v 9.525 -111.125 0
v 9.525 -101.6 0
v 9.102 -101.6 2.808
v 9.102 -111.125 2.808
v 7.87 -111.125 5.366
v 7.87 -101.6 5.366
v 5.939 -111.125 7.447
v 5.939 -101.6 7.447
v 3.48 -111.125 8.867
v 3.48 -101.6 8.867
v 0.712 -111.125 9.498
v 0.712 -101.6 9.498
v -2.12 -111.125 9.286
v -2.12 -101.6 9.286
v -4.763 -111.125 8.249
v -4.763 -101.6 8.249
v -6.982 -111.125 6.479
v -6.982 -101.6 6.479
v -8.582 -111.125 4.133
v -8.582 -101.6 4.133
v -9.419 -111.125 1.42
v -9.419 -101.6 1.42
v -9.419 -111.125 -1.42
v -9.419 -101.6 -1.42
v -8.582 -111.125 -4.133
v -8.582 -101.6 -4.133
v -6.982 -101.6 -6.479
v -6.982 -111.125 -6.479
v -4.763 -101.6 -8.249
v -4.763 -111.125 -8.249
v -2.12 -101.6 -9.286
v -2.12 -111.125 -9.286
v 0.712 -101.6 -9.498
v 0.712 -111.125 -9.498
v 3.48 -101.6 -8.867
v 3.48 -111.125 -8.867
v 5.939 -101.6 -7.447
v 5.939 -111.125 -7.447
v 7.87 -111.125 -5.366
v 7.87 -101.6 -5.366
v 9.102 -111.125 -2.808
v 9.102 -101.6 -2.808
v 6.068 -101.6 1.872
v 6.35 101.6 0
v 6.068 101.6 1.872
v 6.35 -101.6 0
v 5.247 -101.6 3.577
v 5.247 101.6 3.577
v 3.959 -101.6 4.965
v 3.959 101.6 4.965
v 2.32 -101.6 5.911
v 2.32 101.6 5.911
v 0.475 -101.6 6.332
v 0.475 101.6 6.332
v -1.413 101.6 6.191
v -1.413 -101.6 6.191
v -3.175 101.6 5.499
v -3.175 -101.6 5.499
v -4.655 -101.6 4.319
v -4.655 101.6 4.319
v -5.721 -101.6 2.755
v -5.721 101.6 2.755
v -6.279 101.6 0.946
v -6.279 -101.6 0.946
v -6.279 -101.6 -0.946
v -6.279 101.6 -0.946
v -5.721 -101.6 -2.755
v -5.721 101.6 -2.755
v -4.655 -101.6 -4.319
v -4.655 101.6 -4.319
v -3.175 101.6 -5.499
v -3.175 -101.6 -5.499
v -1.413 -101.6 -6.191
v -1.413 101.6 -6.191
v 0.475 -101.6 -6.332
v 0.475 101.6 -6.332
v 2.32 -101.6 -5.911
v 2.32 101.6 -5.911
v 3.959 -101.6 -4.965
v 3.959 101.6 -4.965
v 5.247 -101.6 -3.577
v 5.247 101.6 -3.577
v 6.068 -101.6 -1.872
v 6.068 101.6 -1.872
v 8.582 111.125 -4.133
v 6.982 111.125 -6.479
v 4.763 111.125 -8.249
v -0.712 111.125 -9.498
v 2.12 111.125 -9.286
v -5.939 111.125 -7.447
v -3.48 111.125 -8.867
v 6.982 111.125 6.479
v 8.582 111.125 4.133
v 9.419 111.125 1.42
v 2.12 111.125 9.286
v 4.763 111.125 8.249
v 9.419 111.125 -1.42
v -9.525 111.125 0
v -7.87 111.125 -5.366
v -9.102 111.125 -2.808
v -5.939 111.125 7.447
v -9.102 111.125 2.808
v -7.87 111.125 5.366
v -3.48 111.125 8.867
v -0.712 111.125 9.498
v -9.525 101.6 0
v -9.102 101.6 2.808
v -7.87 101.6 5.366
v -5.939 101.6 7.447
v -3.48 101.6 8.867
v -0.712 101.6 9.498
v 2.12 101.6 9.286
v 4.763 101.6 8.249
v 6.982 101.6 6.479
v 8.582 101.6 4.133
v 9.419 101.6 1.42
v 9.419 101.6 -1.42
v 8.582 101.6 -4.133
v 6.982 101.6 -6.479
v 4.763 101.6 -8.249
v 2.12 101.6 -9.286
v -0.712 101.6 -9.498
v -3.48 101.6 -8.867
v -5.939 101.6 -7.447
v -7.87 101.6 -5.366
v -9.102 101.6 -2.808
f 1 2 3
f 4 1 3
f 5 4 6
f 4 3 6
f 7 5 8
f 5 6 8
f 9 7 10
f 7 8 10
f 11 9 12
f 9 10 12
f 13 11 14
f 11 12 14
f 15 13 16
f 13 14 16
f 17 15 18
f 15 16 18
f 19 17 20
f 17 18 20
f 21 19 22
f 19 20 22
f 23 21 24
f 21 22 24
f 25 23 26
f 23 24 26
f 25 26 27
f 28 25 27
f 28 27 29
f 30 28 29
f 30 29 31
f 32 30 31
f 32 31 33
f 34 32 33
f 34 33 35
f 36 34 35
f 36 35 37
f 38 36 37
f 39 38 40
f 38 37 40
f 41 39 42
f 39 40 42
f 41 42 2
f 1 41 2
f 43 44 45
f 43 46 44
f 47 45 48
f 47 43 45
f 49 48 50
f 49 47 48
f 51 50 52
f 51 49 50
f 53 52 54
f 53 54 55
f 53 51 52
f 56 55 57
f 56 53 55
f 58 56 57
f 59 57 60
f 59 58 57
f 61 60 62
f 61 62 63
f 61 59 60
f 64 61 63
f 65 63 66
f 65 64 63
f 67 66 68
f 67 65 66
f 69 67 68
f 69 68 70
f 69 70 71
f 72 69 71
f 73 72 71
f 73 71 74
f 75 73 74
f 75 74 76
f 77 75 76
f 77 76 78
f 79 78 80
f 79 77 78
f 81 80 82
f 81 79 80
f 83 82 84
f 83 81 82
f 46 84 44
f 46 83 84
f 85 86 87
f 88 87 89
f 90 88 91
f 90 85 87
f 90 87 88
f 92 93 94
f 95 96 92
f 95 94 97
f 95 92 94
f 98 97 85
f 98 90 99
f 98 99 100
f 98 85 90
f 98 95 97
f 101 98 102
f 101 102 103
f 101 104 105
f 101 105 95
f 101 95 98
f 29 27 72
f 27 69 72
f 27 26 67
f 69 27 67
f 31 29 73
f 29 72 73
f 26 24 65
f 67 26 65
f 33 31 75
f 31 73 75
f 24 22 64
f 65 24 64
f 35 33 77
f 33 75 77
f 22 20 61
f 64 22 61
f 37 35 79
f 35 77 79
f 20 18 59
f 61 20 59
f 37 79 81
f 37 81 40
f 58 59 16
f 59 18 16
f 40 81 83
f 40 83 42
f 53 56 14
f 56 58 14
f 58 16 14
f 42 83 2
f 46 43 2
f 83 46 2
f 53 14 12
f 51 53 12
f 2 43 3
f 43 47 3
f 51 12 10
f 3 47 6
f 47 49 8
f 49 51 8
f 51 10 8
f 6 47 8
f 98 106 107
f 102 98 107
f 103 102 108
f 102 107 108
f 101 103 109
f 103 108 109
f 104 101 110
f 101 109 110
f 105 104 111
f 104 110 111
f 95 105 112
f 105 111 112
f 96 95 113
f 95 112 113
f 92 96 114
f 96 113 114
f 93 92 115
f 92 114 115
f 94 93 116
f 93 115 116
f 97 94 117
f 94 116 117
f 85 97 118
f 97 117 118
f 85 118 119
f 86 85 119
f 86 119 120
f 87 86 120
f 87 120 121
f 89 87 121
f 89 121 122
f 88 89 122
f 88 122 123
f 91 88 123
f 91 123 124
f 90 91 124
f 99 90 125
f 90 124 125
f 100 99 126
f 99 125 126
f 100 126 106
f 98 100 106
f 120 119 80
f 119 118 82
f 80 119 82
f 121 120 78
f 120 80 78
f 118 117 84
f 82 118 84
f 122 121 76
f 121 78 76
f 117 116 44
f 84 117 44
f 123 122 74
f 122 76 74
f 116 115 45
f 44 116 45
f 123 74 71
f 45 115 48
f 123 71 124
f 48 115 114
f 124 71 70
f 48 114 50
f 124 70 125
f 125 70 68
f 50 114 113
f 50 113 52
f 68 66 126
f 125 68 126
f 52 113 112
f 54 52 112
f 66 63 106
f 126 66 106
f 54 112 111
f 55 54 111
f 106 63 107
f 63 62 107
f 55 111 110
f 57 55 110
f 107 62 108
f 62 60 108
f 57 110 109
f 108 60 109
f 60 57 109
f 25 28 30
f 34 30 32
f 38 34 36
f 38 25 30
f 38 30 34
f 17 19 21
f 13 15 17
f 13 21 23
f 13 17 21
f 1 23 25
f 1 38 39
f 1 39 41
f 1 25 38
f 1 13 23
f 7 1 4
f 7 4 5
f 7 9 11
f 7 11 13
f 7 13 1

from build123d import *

# Parameters (mm, degrees)
F0_R     = 6.35
F1_DEPTH = 101.6
F2_R     = 9.525
F3_DEPTH = 9.525
F4_R     = 9.525
F5_DEPTH = 9.525


with BuildPart() as f1:
    # F0 (on Front) → F1 (new body, symmetric)
    with BuildSketch(Plane.XZ):
        Circle(F0_R)
    extrude(amount=F1_DEPTH, both=True)

    # F2 (on face) → F3 (join)
    with BuildSketch(Plane.XZ.offset(101.6)):
        Circle(F2_R)
    extrude(amount=F3_DEPTH)

    # F4 (on face) → F5 (join)
    with BuildSketch(Plane(origin=(0, 101.6, 0), x_dir=(-1, 0, 0), z_dir=(0, 1, 0))):
        Circle(F4_R)
    extrude(amount=F5_DEPTH)


solid = f1.part
